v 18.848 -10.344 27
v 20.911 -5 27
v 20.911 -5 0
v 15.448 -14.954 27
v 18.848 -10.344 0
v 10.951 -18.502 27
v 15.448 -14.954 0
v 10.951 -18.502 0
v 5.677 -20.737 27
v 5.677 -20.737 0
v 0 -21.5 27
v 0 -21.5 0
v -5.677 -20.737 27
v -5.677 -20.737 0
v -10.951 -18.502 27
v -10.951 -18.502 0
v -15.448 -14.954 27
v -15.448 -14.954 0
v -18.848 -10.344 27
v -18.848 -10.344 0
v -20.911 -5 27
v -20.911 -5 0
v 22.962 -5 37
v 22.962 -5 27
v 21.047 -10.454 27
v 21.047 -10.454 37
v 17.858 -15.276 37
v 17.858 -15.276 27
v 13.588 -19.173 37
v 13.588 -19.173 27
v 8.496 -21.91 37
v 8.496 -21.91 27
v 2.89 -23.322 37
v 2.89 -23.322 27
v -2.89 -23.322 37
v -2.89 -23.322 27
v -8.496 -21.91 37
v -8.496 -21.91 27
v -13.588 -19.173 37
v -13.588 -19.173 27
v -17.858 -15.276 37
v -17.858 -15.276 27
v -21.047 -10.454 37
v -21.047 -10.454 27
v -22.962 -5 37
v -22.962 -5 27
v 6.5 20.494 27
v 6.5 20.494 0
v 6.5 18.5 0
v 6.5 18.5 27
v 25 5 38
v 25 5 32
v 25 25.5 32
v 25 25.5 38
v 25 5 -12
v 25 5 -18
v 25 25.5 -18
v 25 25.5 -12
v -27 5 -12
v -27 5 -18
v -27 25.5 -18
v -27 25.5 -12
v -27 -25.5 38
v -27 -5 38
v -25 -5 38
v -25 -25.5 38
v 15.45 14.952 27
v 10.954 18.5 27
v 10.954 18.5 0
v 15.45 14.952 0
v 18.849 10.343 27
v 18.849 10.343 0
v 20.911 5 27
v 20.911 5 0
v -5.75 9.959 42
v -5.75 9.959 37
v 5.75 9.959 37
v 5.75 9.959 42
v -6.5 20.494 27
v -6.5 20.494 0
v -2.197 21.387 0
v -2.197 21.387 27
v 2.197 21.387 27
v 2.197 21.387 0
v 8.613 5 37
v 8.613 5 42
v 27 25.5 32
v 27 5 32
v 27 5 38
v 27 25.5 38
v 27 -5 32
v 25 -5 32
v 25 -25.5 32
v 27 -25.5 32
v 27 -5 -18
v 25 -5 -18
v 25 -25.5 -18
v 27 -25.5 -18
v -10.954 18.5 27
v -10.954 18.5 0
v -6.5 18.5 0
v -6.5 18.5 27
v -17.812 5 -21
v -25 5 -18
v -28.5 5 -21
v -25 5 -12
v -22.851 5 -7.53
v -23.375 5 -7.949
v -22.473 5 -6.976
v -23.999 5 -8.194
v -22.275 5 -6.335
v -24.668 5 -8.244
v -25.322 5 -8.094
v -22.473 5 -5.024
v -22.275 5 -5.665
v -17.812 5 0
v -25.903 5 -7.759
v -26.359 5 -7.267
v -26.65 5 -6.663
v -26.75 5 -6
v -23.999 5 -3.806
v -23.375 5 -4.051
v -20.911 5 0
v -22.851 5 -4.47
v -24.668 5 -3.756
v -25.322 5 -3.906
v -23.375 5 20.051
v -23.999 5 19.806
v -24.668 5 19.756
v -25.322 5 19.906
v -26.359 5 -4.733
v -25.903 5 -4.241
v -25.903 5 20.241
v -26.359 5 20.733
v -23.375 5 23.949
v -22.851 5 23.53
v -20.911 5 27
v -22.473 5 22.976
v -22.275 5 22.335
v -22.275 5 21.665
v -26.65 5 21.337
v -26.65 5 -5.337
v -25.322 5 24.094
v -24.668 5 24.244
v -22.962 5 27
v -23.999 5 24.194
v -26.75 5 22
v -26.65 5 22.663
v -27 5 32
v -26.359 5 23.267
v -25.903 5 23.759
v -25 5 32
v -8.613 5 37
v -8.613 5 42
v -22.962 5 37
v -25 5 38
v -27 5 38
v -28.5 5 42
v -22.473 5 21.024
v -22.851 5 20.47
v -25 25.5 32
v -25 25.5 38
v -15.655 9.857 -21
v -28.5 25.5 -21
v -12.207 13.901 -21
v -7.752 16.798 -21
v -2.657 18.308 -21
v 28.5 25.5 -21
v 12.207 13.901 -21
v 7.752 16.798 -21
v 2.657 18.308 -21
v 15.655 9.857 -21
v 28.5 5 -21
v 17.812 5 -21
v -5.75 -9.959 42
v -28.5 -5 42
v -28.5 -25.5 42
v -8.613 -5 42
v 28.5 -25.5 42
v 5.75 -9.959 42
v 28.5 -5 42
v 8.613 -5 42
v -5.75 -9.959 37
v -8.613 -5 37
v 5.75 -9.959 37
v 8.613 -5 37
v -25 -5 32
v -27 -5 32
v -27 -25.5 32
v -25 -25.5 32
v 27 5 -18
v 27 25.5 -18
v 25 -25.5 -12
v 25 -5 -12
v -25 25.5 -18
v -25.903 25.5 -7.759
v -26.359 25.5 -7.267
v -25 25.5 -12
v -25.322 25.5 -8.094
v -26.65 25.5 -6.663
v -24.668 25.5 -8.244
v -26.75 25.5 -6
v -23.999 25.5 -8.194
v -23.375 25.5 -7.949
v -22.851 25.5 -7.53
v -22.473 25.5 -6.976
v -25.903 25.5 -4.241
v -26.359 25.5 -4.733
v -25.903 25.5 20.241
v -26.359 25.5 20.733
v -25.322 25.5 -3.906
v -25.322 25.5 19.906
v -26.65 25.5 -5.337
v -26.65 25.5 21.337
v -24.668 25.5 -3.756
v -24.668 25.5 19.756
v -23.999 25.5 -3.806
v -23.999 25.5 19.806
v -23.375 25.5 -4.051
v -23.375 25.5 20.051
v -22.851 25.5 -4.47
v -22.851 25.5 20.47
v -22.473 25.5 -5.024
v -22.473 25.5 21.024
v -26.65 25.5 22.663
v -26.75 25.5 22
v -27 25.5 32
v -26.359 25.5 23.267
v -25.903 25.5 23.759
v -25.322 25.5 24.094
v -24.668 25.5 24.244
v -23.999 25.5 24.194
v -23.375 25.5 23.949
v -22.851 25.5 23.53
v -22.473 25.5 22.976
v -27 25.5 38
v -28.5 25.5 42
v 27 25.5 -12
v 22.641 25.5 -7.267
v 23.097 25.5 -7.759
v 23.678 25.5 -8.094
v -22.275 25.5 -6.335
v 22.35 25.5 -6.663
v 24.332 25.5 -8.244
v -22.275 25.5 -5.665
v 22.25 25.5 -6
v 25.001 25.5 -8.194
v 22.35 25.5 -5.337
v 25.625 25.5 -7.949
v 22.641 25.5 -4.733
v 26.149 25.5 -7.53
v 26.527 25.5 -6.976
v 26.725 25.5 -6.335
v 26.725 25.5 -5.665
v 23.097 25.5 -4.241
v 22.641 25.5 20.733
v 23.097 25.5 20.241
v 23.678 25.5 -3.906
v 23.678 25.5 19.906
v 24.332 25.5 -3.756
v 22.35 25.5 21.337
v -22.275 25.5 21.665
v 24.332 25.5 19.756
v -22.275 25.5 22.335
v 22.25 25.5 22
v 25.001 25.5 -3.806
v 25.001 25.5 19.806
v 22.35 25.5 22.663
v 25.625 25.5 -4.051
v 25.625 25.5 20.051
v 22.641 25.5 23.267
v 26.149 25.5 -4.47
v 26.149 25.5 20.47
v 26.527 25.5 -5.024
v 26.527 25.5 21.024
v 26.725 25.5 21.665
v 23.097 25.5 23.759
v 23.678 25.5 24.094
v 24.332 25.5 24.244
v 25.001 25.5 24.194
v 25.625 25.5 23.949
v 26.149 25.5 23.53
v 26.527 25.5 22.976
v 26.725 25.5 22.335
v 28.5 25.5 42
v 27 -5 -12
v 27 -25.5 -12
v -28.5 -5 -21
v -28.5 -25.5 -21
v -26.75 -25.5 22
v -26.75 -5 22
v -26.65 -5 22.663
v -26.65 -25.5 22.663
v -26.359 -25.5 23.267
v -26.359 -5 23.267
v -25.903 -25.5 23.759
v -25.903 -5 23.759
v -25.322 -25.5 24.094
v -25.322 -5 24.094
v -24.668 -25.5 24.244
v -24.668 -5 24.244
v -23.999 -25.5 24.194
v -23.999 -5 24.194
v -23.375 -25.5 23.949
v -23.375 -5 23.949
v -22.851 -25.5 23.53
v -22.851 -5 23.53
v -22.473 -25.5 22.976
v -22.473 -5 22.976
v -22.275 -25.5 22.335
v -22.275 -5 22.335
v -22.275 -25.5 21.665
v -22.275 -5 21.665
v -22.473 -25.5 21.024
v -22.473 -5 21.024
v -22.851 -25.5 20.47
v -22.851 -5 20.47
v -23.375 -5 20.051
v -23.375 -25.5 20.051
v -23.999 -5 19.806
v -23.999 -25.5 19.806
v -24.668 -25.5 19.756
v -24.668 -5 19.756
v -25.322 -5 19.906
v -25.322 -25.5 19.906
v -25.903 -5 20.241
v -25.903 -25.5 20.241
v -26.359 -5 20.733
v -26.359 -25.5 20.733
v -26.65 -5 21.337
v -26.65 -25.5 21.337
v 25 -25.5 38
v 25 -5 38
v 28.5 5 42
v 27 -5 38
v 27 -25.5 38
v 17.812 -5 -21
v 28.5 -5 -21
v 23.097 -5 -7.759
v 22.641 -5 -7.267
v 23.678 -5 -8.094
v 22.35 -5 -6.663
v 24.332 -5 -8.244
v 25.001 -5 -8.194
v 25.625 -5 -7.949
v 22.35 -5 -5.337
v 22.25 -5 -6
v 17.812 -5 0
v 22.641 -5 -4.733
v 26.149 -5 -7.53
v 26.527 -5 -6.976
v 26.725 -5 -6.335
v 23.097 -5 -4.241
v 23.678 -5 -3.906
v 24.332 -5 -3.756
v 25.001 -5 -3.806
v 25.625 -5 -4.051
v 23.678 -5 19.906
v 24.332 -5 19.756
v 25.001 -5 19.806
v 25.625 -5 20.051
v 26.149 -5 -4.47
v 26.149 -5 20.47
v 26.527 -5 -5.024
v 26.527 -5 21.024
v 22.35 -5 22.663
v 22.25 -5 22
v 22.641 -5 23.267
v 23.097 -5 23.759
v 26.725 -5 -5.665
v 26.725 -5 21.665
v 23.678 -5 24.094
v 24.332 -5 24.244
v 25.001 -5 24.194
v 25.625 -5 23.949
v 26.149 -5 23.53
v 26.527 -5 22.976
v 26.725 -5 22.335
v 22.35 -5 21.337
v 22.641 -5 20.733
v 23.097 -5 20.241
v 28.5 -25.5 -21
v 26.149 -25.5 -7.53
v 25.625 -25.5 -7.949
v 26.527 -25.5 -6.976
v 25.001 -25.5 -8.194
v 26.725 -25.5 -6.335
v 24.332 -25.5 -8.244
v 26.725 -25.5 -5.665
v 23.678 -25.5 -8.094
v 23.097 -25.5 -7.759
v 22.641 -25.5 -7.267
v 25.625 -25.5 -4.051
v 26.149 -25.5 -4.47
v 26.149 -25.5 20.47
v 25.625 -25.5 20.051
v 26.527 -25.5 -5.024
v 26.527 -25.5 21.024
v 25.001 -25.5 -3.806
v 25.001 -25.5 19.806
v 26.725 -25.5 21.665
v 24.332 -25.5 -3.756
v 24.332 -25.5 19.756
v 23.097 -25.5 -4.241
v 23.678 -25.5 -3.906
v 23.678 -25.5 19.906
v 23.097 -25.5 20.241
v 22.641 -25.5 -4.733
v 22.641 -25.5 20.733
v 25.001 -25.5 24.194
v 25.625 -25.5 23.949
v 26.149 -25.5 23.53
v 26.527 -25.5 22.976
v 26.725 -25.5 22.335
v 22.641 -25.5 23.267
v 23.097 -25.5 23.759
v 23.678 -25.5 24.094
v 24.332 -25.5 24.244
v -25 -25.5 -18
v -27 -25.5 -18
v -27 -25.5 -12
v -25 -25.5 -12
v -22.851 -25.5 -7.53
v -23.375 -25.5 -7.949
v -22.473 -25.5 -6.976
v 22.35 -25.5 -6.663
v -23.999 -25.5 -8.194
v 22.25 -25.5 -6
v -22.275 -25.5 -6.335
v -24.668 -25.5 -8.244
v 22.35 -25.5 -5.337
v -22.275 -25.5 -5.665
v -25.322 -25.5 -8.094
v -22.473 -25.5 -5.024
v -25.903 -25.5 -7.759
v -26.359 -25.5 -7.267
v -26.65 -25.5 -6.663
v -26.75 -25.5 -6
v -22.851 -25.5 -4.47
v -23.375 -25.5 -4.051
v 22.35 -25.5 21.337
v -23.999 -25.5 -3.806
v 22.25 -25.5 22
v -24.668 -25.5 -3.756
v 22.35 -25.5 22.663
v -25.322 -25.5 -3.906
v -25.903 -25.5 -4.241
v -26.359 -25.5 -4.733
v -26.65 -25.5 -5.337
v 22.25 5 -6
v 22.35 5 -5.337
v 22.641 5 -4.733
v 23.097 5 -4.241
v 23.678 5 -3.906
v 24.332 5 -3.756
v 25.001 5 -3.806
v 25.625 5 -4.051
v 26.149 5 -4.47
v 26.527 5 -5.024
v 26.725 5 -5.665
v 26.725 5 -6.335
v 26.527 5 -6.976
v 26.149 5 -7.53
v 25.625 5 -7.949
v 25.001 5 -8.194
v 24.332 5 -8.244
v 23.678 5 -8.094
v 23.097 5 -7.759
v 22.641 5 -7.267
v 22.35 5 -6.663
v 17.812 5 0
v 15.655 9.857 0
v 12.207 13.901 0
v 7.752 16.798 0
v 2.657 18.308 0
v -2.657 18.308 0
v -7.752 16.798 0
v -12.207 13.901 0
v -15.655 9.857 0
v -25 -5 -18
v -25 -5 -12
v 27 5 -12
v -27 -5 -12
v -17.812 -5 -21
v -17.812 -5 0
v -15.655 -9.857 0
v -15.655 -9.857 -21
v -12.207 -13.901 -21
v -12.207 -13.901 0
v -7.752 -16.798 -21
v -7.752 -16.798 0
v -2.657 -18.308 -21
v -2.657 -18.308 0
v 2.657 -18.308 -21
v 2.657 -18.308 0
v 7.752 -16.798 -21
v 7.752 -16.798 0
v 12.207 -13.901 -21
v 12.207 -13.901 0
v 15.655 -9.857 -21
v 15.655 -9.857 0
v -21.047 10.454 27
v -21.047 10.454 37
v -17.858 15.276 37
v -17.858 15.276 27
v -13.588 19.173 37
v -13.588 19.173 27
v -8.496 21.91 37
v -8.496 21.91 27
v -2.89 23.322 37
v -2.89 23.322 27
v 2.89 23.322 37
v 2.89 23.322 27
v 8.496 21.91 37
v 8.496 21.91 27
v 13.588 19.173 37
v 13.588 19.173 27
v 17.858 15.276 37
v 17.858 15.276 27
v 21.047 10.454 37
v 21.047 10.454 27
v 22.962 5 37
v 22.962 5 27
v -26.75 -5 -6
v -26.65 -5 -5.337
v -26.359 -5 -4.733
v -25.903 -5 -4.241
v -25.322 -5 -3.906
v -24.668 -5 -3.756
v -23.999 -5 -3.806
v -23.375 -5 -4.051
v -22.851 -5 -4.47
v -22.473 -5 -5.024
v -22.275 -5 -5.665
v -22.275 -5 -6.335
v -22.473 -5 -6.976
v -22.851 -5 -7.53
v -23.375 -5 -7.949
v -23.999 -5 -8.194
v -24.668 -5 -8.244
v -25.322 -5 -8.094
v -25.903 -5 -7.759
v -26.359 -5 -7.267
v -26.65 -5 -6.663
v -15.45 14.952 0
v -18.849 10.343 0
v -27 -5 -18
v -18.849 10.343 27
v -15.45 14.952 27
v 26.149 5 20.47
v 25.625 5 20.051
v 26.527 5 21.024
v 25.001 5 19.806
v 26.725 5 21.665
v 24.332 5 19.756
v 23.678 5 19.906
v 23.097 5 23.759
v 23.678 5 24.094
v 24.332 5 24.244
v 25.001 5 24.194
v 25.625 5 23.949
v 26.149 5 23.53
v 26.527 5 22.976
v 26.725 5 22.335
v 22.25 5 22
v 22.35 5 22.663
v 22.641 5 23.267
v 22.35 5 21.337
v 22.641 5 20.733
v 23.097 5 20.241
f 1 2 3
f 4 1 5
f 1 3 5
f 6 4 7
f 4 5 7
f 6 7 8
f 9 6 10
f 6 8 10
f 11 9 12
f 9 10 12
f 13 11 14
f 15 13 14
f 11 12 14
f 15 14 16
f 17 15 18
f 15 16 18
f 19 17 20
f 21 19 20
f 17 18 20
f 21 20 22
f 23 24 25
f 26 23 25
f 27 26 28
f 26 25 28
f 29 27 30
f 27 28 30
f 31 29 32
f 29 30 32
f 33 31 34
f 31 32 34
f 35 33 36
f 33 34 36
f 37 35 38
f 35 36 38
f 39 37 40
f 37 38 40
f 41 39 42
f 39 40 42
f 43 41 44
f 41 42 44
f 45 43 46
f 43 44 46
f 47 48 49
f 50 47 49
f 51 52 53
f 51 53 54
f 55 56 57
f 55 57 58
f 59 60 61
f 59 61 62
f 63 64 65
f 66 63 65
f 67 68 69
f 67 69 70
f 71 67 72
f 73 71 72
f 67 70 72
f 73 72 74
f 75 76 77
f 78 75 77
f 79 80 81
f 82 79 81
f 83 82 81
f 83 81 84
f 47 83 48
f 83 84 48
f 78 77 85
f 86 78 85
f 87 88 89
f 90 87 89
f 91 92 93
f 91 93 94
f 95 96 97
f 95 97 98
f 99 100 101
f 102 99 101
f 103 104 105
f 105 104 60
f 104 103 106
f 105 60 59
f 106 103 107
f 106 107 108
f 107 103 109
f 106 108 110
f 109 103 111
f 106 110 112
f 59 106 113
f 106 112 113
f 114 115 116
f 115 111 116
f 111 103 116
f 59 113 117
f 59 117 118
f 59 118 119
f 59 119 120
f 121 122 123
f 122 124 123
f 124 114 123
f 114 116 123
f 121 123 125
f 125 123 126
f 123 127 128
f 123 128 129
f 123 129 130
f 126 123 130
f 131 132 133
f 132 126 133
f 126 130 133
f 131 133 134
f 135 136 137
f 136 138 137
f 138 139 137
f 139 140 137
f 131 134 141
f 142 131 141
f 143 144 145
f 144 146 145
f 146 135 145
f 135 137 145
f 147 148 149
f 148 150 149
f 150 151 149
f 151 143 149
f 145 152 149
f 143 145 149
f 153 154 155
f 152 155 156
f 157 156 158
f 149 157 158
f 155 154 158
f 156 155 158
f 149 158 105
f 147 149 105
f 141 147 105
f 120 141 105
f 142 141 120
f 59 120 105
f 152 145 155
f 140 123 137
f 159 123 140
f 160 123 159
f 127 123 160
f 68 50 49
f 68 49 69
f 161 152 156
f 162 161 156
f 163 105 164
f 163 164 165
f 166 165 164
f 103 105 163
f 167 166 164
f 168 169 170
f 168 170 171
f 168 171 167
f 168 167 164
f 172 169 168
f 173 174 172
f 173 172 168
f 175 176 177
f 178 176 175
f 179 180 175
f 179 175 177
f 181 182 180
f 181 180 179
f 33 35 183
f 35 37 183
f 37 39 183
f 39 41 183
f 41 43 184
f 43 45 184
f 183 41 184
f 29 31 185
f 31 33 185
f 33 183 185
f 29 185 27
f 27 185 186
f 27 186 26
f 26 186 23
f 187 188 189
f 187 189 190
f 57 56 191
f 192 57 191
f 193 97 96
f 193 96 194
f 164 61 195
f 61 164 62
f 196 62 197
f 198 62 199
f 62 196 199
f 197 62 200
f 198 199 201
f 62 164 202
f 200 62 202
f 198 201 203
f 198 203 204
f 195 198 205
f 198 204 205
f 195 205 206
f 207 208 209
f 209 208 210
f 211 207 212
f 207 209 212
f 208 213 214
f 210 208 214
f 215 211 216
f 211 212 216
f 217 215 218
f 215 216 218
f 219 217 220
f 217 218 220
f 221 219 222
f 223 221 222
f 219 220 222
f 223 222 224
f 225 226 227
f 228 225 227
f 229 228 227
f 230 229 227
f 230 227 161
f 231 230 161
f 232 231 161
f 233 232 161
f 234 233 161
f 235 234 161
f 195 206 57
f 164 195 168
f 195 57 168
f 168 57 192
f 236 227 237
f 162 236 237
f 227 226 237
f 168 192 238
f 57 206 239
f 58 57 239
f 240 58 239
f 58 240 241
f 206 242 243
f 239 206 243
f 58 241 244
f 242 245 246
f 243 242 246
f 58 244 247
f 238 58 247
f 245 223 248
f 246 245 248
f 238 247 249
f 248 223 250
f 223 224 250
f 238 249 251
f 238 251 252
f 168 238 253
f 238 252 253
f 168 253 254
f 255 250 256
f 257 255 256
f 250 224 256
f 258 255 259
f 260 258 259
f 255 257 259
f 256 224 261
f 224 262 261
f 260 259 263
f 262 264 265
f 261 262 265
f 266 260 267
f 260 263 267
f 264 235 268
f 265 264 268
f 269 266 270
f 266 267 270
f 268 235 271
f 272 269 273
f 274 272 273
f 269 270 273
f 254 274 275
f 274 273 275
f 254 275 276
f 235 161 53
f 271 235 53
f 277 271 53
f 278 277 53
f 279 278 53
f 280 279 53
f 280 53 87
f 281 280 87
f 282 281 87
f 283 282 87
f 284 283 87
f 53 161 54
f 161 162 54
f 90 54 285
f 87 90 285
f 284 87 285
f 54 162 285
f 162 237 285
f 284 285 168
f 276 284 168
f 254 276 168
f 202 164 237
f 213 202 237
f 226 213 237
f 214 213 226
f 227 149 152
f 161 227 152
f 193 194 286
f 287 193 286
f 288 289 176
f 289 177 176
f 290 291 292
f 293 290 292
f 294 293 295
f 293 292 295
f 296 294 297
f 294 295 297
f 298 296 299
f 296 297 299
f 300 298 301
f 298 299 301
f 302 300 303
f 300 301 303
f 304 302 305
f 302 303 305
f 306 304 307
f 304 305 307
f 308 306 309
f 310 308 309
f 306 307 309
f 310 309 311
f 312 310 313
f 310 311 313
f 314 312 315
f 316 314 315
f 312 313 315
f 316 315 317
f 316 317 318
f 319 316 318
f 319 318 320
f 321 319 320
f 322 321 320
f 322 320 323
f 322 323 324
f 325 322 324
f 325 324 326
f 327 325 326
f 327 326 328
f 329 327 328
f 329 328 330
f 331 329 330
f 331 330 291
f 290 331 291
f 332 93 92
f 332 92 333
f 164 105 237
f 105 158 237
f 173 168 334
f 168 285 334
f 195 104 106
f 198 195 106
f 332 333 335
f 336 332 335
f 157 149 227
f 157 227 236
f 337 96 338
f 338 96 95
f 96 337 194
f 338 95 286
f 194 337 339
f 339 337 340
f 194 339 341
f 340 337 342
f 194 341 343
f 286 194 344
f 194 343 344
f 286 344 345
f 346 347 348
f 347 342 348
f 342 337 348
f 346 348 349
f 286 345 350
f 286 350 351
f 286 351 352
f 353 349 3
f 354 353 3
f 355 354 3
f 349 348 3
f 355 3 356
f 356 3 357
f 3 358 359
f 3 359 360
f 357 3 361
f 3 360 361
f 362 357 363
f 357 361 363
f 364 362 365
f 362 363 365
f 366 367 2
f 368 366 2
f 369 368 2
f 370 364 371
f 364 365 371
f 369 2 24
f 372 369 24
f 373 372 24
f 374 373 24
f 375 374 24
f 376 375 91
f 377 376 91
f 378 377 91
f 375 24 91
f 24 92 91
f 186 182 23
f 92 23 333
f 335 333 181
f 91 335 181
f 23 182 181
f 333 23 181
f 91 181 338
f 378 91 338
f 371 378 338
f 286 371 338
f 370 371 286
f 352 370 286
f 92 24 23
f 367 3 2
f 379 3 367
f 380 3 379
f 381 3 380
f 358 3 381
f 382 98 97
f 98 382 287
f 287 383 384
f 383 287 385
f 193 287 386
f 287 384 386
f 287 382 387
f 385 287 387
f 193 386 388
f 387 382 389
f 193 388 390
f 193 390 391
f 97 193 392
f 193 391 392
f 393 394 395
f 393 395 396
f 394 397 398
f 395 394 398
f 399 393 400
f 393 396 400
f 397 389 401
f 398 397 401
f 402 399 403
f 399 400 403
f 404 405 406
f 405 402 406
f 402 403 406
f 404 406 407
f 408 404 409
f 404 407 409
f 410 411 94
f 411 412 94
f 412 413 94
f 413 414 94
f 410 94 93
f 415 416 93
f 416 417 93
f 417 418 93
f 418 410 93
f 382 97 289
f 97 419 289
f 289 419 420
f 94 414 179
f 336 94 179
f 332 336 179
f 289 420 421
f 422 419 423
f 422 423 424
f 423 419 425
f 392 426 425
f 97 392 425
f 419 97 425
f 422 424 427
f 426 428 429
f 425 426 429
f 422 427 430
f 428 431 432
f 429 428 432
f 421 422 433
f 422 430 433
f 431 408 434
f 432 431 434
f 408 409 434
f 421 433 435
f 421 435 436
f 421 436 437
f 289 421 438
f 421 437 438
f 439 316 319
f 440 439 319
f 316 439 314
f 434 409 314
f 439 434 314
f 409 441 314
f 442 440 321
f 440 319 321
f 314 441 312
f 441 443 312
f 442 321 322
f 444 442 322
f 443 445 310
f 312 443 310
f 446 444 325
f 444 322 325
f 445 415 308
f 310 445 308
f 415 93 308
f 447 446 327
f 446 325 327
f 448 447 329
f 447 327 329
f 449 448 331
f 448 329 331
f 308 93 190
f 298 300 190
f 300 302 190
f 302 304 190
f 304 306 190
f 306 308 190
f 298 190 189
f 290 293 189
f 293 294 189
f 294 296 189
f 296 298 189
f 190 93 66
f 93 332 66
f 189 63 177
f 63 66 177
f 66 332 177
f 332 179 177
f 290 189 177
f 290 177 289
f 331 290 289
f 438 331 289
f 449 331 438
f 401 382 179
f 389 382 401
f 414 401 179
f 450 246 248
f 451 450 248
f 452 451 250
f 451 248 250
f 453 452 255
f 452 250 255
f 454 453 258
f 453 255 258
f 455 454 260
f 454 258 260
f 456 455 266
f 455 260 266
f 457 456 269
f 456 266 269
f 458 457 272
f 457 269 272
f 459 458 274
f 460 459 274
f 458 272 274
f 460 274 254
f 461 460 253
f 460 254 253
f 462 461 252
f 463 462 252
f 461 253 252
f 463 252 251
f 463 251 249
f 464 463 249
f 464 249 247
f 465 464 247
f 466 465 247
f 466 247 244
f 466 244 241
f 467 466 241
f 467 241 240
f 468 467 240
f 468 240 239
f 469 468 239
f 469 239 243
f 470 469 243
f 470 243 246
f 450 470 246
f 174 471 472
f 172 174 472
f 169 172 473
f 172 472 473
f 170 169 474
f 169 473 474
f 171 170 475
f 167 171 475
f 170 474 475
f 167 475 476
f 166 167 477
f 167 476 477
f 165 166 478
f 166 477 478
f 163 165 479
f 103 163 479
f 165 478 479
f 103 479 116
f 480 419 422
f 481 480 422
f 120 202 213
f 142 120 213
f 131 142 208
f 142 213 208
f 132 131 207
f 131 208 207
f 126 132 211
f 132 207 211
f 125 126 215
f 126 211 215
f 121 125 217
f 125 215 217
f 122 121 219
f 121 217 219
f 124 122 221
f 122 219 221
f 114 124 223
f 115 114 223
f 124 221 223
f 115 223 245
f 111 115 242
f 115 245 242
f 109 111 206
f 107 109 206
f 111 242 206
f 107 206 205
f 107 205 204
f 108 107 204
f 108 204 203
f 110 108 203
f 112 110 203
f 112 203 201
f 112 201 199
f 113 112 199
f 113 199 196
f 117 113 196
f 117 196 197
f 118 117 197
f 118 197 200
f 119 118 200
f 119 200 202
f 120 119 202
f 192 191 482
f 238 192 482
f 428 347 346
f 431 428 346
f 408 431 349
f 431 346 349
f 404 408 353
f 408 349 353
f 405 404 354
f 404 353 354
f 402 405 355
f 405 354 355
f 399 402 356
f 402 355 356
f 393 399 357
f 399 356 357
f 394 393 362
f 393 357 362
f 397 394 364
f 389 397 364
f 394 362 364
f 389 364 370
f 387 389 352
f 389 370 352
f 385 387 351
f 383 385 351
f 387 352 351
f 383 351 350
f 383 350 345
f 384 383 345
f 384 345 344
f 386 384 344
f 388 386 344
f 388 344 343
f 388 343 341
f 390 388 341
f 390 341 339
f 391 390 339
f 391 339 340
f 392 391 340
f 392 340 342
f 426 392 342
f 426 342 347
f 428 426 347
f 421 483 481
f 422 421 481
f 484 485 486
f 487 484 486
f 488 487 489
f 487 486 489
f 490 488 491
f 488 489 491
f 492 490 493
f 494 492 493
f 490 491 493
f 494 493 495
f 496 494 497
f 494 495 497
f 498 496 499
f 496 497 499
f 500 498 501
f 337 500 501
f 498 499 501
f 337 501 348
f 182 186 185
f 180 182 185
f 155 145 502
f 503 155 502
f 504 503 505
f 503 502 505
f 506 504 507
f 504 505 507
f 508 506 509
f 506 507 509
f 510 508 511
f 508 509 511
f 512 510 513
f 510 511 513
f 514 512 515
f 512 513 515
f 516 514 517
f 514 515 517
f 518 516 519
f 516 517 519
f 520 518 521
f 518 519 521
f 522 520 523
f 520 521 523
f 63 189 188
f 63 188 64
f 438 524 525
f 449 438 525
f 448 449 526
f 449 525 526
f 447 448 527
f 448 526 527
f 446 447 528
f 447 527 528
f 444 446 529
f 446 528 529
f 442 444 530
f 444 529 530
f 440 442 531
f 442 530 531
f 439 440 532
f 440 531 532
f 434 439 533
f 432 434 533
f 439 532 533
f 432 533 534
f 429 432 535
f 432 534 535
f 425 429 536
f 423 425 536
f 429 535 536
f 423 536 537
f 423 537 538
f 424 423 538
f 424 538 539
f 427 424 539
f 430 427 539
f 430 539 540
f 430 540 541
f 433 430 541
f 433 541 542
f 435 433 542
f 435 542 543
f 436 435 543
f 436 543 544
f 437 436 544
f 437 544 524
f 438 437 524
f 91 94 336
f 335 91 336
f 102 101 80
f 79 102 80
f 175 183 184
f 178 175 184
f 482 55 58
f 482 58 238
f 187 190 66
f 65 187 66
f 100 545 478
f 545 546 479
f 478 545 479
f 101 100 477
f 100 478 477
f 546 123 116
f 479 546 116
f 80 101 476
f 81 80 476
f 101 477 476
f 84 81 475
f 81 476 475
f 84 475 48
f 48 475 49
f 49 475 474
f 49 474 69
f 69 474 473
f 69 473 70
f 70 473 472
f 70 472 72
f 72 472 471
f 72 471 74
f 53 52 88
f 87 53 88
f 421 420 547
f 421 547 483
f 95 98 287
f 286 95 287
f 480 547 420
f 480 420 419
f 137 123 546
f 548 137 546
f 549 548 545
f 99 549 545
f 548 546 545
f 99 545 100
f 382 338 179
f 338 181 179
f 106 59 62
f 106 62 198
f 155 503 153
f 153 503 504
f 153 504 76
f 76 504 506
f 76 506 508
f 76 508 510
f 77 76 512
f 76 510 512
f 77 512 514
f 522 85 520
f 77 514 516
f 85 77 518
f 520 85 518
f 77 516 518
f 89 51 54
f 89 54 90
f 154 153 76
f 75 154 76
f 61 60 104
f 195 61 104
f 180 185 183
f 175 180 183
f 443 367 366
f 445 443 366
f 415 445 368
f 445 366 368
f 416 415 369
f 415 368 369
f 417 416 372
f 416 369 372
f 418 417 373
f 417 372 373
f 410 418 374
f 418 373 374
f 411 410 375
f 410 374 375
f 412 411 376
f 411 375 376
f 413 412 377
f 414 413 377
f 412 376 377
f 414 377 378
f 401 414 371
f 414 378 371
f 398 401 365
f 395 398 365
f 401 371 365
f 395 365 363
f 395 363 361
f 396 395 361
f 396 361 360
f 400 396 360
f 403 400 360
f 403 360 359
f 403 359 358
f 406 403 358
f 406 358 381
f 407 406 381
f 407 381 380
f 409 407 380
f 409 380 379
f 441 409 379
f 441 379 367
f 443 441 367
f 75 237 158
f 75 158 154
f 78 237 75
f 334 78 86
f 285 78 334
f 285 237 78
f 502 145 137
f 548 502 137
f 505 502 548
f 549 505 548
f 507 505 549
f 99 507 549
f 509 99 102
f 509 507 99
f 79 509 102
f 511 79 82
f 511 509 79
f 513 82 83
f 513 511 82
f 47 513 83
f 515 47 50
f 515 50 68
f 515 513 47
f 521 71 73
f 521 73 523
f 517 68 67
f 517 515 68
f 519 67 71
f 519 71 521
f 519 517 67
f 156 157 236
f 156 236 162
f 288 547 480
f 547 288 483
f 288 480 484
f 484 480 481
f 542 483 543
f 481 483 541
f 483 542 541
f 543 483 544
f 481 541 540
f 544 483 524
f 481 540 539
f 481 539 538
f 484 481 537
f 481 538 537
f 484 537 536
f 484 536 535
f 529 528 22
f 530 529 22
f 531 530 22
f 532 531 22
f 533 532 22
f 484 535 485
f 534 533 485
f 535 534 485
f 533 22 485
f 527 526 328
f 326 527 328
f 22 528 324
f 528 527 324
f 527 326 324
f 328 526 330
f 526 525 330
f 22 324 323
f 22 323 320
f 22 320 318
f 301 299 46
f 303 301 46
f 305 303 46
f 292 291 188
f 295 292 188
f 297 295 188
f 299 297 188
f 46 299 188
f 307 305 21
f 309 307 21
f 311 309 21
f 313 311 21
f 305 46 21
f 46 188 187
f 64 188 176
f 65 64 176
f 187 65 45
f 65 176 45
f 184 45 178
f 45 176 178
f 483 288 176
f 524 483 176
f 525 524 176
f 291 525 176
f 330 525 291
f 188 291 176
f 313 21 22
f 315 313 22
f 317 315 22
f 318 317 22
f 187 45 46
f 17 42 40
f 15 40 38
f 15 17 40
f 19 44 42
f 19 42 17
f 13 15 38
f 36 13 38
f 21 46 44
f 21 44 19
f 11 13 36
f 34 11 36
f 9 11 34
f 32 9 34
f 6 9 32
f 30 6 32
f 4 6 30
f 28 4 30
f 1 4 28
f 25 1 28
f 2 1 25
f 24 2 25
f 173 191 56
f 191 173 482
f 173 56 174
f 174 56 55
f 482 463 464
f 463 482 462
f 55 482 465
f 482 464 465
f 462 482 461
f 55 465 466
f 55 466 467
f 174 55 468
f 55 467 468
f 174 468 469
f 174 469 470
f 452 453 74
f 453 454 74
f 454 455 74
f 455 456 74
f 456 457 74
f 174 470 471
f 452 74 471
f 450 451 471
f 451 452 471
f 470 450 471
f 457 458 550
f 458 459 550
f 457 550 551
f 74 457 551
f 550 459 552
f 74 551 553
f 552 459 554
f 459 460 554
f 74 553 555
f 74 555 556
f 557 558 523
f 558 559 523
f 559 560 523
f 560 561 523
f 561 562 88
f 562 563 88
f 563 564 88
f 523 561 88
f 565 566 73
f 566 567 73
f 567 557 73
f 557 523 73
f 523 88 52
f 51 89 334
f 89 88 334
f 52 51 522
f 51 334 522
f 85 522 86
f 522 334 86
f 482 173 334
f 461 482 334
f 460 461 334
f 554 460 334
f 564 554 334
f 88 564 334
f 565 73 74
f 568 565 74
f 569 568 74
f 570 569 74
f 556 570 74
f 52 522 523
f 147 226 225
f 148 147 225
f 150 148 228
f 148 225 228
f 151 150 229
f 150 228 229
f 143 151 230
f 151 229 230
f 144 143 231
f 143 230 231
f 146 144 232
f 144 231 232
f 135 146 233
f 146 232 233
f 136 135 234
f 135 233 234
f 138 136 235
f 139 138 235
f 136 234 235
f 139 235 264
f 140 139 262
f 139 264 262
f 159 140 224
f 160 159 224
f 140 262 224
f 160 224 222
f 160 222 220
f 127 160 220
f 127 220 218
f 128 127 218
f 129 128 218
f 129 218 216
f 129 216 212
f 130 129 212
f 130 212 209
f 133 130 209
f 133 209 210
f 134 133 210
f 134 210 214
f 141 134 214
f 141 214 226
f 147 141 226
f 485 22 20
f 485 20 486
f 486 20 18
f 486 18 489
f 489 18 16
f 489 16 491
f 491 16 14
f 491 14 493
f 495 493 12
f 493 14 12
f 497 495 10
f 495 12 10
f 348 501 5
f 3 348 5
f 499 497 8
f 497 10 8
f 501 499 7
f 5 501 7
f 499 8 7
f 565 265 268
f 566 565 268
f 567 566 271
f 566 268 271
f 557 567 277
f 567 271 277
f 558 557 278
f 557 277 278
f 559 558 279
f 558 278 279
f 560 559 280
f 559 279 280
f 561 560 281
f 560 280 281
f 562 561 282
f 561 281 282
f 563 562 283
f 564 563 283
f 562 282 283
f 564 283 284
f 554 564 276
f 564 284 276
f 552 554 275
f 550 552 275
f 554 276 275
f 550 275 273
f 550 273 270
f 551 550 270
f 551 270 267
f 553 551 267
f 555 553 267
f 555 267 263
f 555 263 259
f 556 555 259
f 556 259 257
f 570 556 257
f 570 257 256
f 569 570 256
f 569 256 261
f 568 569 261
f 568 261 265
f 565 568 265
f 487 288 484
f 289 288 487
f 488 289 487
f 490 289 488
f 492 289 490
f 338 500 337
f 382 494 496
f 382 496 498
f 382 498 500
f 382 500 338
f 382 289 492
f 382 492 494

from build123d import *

# Parameters (mm, degrees)
F1_DEPTH  = 27
F3_DEPTH  = 10
F4_DEPTH  = 10
F6_DEPTH  = 5
F7_DEPTH  = 5
F9_DEPTH  = 21
F10_DEPTH = 21
F12_D     = 4.5
F11_W     = 2
F11_H     = 6
F13_DEPTH = 51.001


with BuildPart() as f1:
    # F0 (on Top) → F1 (new body)
    with BuildSketch(Plane.XY):
        with BuildLine():
            Line((6.5, 20.493902), (6.5, 18.5))
            Line((6.5, 18.5), (10.954451, 18.5))
            ThreePointArc((10.954451, 18.5), (17.303371, 12.761009), (20.910524, 5))
            Line((20.910524, 5), (28.5, 5))
            Line((28.5, 5), (28.5, 25.5))
            Line((28.5, 25.5), (-28.5, 25.5))
            Line((-28.5, 25.5), (-28.5, 5))
            Line((-28.5, 5), (-20.910524, 5))
            ThreePointArc((-20.910524, 5), (-17.303371, 12.761009), (-10.954451, 18.5))
            Line((-10.954451, 18.5), (-6.5, 18.5))
            Line((-6.5, 18.5), (-6.5, 20.493902))
            ThreePointArc((-6.5, 20.493902), (0, 21.5), (6.5, 20.493902))
        make_face()
        with BuildLine():
            Line((-28.5, -5), (-28.5, -25.5))
            Line((-28.5, -25.5), (28.5, -25.5))
            Line((28.5, -25.5), (28.5, -5))
            Line((28.5, -5), (20.910524, -5))
            ThreePointArc((20.910524, -5), (0, -21.5), (-20.910524, -5))
            Line((-20.910524, -5), (-28.5, -5))
        make_face()
    extrude(amount=F1_DEPTH)

    # F2 (on face) → F3 (join)
    with BuildSketch(Plane.XY.offset(27)):
        with BuildLine():
            Line((28.5, 5), (28.5, 25.5))
            Line((28.5, 25.5), (-28.5, 25.5))
            Line((-28.5, 25.5), (-28.5, 5))
            Line((-28.5, 5), (-22.961925, 5))
            ThreePointArc((-22.961925, 5), (0, 23.5), (22.961925, 5))
            Line((22.961925, 5), (28.5, 5))
        make_face()
    extrude(amount=F3_DEPTH)

    # F2 (on face) → F4 (join)
    with BuildSketch(Plane.XY.offset(27)):
        with BuildLine():
            Line((-22.961925, -5), (-28.5, -5))
            Line((-28.5, -5), (-28.5, -25.5))
            Line((-28.5, -25.5), (28.5, -25.5))
            Line((28.5, -25.5), (28.5, -5))
            Line((28.5, -5), (22.961925, -5))
            ThreePointArc((22.961925, -5), (0, -23.5), (-22.961925, -5))
        make_face()
    extrude(amount=F4_DEPTH)

    # F5 (on face) → F6 (join)
    with BuildSketch(Plane.XY.offset(37)):
        with BuildLine():
            ThreePointArc((22.961925, 5), (0, 23.5), (-22.961925, 5))
            Line((-22.961925, 5), (-8.613249, 5))
            Line((-8.613249, 5), (-5.75, 9.959292))
            Line((-5.75, 9.959292), (5.75, 9.959292))
            Line((5.75, 9.959292), (8.613249, 5))
            Line((8.613249, 5), (22.961925, 5))
        make_face()
        with BuildLine():
            Line((-28.5, 25.5), (-28.5, 5))
            Line((-28.5, 5), (-22.961925, 5))
            ThreePointArc((-22.961925, 5), (0, 23.5), (22.961925, 5))
            Line((22.961925, 5), (28.5, 5))
            Line((28.5, 5), (28.5, 25.5))
            Line((28.5, 25.5), (-28.5, 25.5))
        make_face()
    extrude(amount=F6_DEPTH)

    # F5 (on face) → F7 (join)
    with BuildSketch(Plane.XY.offset(37)):
        Polygon((-8.613249, -5), (-22.961925, -5), (-28.5, -5), (-28.5, -25.5), (28.5, -25.5), (28.5, -5), (22.961925, -5), (8.613249, -5), (5.75, -9.959292), (-5.75, -9.959292), align=None)
    extrude(amount=F7_DEPTH)

    # F8 (on face) → F9 (join)
    with BuildSketch(Plane(origin=(0, 0, 0), x_dir=(1, 0, 0), z_dir=(0, 0, -1))):
        with BuildLine():
            Line((17.811513, 5), (20.910524, 5))
            Line((20.910524, 5), (28.5, 5))
            Line((28.5, 5), (28.5, 25.5))
            Line((28.5, 25.5), (-28.5, 25.5))
            Line((-28.5, 25.5), (-28.5, 5))
            Line((-28.5, 5), (-20.910524, 5))
            Line((-20.910524, 5), (-17.811513, 5))
            ThreePointArc((-17.811513, 5), (0, 18.5), (17.811513, 5))
        make_face()
    extrude(amount=F9_DEPTH)

    # F8 (on face) → F10 (join)
    with BuildSketch(Plane(origin=(0, 0, 0), x_dir=(1, 0, 0), z_dir=(0, 0, -1))):
        with BuildLine():
            Line((-17.811513, -5), (-20.910524, -5))
            ThreePointArc((-20.910524, -5), (-17.303371, -12.761009), (-10.954451, -18.5))
            Line((-10.954451, -18.5), (-6.5, -18.5))
            Line((-6.5, -18.5), (-6.5, -20.493902))
            ThreePointArc((-6.5, -20.493902), (0, -21.5), (6.5, -20.493902))
            Line((6.5, -20.493902), (6.5, -18.5))
            Line((6.5, -18.5), (10.954451, -18.5))
            ThreePointArc((10.954451, -18.5), (17.303371, -12.761009), (20.910524, -5))
            Line((20.910524, -5), (17.811513, -5))
            ThreePointArc((17.811513, -5), (0, -18.5), (-17.811513, -5))
        make_face()
        with BuildLine():
            Line((-28.5, -5), (-28.5, -25.5))
            Line((-28.5, -25.5), (28.5, -25.5))
            Line((28.5, -25.5), (28.5, -5))
            Line((28.5, -5), (20.910524, -5))
            ThreePointArc((20.910524, -5), (17.303371, -12.761009), (10.954451, -18.5))
            Line((10.954451, -18.5), (6.5, -18.5))
            Line((6.5, -18.5), (6.5, -20.493902))
            ThreePointArc((6.5, -20.493902), (0, -21.5), (-6.5, -20.493902))
            Line((-6.5, -20.493902), (-6.5, -18.5))
            Line((-6.5, -18.5), (-10.954451, -18.5))
            ThreePointArc((-10.954451, -18.5), (-17.303371, -12.761009), (-20.910524, -5))
            Line((-20.910524, -5), (-28.5, -5))
        make_face()
    extrude(amount=F10_DEPTH)

    # F12 (through all)
    with Locations(Plane.XZ.offset(25.5)):
        with Locations((24.5, 22), (24.5, -6), (-24.5, 22), (-24.5, -6)):
            Hole(F12_D / 2)

    # F11 (on face) → F13 (cut, through all)
    with BuildSketch(Plane.XZ.offset(25.5)):
        with Locations((-26, 35)):
            Rectangle(F11_W, F11_H)
        with Locations((26, 35)):
            Rectangle(F11_W, F11_H)
        with Locations((-26, -15)):
            Rectangle(F11_W, F11_H)
        with Locations((26, -15)):
            Rectangle(F11_W, F11_H)
    extrude(amount=-F13_DEPTH, mode=Mode.SUBTRACT)


solid = f1.part
